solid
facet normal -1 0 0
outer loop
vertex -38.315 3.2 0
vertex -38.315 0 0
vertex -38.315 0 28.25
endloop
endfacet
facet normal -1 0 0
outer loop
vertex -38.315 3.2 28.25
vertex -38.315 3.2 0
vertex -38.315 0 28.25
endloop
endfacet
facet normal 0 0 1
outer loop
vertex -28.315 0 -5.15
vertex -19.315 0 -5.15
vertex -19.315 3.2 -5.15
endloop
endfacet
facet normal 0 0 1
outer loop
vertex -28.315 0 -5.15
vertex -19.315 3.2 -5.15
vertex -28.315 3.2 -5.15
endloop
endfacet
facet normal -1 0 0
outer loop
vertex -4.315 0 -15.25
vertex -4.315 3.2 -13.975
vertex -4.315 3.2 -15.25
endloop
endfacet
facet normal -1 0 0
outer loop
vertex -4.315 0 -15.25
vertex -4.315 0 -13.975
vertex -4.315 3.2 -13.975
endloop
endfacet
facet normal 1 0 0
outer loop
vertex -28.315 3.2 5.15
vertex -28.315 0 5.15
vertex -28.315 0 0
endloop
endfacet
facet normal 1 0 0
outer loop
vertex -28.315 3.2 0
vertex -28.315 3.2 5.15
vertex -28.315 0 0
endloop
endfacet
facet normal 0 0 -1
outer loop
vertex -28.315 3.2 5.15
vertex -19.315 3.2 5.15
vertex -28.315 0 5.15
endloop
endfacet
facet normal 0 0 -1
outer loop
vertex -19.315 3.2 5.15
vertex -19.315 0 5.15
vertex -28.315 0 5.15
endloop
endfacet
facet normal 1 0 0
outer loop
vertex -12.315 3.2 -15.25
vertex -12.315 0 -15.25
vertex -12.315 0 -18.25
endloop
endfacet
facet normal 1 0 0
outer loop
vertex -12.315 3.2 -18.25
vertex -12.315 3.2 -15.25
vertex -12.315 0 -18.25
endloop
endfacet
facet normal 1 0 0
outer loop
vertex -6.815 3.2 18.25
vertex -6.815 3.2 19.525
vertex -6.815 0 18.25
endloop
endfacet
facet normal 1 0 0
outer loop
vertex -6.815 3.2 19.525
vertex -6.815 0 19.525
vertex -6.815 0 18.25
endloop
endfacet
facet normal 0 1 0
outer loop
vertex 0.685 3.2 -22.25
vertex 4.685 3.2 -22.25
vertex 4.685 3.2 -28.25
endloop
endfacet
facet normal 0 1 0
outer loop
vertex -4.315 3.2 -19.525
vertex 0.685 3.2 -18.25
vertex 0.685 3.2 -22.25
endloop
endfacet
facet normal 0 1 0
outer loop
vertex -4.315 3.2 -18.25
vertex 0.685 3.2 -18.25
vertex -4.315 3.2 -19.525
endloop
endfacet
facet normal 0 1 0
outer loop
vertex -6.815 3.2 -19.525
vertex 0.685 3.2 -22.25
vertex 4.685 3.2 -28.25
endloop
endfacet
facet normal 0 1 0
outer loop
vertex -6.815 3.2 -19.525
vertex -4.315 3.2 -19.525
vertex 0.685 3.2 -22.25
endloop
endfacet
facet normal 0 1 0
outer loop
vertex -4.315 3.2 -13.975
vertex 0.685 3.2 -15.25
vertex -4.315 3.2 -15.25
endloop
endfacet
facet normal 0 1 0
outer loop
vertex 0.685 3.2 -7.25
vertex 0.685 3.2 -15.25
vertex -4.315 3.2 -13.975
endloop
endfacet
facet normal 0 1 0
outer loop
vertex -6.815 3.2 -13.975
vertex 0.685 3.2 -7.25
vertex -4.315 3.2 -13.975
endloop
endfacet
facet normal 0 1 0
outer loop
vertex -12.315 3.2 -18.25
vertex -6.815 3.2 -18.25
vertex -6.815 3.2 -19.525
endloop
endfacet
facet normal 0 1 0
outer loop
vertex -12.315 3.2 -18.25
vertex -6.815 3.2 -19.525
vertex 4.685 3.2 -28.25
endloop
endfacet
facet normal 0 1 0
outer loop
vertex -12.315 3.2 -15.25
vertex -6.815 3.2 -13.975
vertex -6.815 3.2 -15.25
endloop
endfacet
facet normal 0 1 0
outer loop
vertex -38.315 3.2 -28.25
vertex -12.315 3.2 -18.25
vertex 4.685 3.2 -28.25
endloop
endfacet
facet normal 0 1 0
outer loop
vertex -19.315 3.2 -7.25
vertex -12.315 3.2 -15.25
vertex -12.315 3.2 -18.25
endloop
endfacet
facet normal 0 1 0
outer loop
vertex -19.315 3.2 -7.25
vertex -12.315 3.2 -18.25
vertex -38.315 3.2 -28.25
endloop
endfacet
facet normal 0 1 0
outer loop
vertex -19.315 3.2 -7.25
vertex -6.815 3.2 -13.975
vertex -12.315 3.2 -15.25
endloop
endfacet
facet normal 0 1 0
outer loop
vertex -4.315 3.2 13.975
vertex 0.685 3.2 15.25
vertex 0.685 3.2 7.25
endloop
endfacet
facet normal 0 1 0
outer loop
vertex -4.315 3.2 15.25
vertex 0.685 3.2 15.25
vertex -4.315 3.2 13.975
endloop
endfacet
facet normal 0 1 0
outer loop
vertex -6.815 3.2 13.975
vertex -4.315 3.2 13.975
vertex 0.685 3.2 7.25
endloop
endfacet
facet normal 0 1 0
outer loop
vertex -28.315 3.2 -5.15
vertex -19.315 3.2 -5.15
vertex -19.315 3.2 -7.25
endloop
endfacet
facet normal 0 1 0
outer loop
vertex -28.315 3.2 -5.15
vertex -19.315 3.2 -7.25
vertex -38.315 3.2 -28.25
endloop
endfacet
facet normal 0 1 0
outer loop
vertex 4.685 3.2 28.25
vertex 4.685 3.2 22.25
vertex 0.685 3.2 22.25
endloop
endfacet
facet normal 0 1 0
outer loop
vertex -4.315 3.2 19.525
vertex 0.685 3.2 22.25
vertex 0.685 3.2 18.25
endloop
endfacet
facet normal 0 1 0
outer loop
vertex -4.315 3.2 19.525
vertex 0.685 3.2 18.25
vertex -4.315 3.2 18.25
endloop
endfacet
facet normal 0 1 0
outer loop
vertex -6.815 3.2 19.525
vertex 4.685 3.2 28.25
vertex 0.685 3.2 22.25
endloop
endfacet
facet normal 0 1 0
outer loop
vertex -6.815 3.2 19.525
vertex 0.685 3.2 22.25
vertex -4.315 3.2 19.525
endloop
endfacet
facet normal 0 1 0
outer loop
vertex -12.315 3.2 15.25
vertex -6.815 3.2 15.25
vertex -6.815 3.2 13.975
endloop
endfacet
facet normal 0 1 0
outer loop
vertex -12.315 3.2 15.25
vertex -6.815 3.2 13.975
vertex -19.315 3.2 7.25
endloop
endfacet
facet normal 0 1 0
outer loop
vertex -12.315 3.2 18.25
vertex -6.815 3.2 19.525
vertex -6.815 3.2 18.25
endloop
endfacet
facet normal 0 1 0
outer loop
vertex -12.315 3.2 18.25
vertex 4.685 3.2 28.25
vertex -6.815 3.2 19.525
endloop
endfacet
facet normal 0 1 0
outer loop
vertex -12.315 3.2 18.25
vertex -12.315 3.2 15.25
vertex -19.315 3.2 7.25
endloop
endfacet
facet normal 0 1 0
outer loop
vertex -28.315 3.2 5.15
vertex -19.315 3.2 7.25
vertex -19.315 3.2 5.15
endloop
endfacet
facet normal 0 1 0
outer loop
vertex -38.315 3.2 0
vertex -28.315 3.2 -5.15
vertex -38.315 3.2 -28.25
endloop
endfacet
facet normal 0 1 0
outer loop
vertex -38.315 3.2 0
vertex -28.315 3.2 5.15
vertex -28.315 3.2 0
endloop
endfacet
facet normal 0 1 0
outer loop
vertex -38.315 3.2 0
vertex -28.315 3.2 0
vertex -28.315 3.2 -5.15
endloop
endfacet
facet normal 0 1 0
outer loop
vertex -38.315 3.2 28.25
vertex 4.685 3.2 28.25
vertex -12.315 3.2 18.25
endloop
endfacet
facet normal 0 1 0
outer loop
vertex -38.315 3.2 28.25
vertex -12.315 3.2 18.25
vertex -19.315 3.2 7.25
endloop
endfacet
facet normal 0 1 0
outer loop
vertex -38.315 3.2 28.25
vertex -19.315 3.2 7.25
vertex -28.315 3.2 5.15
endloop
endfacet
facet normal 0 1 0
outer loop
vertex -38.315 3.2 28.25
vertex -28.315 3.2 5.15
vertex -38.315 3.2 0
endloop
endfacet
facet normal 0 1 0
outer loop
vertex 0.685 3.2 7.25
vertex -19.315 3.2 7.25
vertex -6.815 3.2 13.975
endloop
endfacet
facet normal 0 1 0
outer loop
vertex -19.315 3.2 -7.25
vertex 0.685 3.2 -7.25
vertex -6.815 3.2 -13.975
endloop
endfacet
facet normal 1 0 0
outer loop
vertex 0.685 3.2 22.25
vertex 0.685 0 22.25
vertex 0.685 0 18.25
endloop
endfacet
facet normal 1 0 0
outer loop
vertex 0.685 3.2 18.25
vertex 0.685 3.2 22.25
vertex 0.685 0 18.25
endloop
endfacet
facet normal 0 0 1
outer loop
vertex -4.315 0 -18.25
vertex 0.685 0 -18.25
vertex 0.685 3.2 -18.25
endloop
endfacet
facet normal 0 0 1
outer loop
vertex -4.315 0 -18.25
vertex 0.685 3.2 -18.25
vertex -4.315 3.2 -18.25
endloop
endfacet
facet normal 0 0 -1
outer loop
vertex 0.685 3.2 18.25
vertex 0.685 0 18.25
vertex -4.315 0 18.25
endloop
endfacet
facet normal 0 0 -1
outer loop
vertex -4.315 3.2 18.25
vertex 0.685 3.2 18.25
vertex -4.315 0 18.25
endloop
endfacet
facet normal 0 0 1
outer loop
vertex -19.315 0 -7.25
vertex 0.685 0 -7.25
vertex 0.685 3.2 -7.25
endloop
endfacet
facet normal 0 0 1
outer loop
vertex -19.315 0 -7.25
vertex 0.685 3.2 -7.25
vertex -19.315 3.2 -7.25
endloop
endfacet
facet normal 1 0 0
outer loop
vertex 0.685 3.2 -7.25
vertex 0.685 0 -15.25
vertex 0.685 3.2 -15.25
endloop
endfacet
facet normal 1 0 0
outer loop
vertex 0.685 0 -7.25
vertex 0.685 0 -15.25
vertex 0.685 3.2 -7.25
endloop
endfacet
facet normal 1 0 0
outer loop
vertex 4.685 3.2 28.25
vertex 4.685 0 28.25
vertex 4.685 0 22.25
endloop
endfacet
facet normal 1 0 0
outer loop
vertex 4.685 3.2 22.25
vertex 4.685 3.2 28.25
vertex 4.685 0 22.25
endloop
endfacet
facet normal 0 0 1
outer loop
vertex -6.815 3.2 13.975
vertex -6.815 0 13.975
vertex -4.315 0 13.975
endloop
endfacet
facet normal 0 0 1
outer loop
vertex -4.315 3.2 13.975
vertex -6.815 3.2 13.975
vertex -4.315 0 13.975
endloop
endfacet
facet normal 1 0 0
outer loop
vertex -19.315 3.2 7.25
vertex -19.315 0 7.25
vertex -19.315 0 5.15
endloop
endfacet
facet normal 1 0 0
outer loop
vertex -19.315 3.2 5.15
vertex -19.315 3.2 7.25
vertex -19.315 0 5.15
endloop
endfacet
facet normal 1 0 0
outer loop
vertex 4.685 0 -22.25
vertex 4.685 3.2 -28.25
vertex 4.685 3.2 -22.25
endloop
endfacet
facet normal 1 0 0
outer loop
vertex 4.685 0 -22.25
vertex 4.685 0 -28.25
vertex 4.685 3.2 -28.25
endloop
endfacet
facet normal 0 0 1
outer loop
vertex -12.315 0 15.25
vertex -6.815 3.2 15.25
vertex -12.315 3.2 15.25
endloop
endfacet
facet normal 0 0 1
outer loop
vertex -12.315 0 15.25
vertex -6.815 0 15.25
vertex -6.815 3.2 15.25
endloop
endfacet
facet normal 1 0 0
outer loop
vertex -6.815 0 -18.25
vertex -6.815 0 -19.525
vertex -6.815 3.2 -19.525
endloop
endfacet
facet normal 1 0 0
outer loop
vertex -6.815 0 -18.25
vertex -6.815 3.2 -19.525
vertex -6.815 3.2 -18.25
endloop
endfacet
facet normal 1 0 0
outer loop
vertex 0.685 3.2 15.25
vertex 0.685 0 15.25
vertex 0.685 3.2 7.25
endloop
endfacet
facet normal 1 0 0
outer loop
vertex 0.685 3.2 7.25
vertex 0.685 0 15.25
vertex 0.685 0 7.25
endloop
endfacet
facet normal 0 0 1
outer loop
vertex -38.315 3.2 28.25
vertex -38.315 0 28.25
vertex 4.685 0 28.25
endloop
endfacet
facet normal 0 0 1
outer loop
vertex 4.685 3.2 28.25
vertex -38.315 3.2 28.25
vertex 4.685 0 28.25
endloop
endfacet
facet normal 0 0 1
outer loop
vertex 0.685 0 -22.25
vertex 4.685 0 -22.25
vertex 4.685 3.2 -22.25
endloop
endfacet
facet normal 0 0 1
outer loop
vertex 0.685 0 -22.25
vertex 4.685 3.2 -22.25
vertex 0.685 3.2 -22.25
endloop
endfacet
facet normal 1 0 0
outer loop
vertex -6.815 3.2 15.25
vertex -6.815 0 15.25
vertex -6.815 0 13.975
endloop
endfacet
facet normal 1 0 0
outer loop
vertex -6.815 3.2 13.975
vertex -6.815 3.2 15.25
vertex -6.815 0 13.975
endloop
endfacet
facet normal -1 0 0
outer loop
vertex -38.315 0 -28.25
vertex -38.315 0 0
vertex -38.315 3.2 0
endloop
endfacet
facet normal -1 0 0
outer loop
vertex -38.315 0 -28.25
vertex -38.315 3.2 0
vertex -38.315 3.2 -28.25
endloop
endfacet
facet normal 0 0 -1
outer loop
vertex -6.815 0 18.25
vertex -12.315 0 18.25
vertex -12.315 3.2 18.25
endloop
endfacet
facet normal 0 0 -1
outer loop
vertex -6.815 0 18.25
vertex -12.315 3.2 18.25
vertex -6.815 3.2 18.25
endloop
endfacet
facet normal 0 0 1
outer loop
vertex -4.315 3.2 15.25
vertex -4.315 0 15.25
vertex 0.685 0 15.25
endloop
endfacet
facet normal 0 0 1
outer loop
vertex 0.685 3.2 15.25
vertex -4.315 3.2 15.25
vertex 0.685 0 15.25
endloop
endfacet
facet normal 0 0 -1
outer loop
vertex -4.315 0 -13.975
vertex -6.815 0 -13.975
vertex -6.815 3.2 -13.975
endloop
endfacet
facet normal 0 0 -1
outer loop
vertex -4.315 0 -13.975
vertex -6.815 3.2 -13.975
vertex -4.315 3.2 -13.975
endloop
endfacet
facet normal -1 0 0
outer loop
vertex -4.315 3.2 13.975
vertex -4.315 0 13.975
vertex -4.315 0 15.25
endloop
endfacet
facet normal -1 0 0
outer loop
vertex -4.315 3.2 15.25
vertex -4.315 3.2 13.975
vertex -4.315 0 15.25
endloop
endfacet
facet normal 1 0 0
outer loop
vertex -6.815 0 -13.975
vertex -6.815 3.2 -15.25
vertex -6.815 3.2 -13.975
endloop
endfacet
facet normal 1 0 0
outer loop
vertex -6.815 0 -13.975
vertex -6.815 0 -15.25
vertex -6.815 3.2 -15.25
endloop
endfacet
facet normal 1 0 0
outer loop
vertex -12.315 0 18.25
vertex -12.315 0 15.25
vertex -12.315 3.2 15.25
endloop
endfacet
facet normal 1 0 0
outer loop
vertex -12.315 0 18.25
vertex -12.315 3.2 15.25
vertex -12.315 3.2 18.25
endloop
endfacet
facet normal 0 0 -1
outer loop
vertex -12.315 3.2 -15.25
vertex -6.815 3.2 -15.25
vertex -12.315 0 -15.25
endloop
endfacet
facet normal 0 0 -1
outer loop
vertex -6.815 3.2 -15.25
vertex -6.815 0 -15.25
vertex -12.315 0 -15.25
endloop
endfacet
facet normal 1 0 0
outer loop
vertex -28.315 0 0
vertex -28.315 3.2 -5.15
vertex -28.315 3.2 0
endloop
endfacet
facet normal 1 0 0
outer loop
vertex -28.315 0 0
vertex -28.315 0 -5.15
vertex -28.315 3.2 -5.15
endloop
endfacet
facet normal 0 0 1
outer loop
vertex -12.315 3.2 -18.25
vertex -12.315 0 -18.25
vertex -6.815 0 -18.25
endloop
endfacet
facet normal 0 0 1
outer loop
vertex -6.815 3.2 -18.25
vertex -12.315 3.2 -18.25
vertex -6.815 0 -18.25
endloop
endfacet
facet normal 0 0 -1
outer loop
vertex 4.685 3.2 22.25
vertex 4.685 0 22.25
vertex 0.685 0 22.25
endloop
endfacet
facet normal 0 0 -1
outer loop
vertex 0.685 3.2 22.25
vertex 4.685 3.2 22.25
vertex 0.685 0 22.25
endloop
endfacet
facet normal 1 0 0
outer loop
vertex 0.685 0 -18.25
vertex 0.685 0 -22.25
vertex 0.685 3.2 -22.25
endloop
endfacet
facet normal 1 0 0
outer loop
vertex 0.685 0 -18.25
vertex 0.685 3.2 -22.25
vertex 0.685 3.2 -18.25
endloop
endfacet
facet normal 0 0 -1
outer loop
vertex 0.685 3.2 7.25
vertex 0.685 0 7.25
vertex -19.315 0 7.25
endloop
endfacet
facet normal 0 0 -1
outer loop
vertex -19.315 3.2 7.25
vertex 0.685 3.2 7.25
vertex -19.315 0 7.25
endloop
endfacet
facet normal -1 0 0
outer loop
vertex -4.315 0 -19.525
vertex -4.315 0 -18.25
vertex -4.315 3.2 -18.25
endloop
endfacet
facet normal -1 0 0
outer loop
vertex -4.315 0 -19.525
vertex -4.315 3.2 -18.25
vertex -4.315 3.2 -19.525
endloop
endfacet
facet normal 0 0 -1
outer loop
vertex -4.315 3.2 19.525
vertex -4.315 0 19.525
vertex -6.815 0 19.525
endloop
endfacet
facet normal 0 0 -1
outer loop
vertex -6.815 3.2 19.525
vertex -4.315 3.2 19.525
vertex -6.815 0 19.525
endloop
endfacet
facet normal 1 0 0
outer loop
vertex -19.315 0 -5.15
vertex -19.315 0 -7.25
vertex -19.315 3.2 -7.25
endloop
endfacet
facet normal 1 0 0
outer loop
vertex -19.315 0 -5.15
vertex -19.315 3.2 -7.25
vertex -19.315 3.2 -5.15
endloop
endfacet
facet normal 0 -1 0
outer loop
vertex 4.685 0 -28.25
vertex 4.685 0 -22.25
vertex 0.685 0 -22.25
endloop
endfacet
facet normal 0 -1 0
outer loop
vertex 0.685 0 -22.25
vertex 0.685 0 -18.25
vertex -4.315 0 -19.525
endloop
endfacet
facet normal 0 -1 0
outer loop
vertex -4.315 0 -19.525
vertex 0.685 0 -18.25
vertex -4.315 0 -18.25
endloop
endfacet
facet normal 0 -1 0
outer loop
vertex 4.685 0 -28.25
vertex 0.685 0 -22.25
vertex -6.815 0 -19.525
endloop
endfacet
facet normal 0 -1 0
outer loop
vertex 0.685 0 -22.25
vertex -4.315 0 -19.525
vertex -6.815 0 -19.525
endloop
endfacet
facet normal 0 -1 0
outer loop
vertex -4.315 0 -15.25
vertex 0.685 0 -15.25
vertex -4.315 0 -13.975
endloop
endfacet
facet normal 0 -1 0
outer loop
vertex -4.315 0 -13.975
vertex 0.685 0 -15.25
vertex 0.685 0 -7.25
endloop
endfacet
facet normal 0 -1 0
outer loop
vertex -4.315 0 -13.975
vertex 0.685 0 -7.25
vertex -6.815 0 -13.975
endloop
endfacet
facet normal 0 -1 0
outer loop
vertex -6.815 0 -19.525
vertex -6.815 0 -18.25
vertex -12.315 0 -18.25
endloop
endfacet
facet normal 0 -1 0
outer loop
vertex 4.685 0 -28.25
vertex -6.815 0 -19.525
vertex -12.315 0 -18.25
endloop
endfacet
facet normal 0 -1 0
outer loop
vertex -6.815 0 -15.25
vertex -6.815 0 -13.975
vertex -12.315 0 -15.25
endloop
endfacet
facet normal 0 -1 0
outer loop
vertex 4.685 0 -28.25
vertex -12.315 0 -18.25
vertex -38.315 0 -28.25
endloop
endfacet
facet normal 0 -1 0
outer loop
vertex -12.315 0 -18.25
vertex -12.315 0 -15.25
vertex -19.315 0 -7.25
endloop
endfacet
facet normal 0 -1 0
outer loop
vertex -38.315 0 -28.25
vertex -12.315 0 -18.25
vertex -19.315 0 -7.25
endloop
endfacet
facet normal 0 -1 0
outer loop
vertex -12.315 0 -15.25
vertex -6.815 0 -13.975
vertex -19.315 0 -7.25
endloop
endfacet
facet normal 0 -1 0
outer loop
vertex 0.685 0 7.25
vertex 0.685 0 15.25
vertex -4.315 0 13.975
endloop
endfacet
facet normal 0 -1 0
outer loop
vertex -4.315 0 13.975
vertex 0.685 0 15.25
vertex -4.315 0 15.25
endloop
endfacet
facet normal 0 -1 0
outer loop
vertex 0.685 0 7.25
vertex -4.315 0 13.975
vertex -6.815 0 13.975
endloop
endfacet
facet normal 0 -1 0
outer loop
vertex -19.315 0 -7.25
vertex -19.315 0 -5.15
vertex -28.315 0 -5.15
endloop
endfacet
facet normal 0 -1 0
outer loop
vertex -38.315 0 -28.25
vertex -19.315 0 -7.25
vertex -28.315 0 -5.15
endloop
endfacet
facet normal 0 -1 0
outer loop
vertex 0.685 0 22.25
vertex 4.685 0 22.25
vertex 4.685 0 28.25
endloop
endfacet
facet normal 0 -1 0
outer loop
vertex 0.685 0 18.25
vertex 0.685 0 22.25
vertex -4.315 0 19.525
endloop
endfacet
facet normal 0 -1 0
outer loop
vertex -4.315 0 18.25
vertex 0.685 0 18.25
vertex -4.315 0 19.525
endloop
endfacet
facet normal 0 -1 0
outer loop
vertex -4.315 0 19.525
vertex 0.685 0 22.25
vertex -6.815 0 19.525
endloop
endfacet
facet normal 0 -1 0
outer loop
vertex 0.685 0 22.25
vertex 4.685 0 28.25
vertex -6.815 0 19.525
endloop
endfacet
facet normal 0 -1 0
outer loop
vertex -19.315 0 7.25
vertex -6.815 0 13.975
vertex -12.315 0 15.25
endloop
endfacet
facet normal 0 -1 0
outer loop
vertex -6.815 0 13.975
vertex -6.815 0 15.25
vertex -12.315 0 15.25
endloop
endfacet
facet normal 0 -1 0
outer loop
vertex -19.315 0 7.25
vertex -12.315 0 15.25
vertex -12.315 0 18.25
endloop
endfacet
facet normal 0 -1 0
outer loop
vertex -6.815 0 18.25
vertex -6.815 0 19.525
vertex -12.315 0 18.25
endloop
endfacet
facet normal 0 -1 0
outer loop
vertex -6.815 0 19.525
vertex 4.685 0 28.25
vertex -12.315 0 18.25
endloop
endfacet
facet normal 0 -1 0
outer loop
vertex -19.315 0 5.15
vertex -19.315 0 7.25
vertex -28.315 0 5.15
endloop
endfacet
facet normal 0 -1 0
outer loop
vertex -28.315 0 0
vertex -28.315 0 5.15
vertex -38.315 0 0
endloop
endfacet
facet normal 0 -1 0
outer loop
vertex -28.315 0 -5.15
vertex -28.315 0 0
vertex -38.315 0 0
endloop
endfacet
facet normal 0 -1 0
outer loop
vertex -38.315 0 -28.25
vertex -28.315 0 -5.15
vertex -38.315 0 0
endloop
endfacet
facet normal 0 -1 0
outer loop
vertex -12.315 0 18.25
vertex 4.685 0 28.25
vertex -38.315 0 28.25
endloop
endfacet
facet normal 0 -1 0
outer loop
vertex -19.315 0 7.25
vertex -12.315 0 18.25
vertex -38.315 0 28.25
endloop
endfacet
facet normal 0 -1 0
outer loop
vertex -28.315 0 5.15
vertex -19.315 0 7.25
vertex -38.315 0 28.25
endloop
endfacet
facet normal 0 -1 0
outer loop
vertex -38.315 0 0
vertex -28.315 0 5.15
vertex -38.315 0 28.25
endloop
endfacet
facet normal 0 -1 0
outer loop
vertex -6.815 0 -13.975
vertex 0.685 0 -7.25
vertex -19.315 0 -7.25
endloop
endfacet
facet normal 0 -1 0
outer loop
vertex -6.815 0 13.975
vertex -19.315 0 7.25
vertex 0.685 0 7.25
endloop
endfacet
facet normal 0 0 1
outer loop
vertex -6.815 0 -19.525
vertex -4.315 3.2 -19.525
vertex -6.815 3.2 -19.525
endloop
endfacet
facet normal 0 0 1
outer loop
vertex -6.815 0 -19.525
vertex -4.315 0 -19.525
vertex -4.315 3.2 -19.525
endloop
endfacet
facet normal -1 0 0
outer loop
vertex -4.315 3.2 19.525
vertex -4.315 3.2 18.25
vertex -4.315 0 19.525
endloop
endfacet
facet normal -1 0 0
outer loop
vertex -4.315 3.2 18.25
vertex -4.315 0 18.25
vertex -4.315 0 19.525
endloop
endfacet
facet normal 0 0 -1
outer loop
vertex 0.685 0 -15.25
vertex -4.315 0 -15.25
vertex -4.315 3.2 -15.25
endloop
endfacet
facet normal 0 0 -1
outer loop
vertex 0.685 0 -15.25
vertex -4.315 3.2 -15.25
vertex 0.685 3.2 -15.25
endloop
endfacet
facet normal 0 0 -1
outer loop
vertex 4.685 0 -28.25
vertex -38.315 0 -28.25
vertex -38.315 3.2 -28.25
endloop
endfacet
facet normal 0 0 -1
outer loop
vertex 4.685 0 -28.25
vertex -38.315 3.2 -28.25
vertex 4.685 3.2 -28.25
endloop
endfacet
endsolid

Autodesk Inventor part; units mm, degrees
ref_plane "YZ Plane" through (0, 0, 0) normal (1, 0, 0) x (0, 1, 0)
ref_plane "XZ Plane" through (0, 0, 0) normal (0, 1, 0) x (-1, 0, 0)
ref_plane "XY Plane" through (0, 0, 0) normal (0, 0, 1) x (1, 0, 0)
sketch "Sketch1" plane through (0, 0, 0) normal (0, 1, 0) x (-1, 0, 0)
  line L0 (38.3151, 0) -> (38.3151, -28.25)
  line L1 (38.3151, -28.25) -> (-4.6849, -28.25)
  line L2 (-4.6849, -28.25) -> (-4.6849, -22.25)
  line L3 (-4.6849, -22.25) -> (-0.6849, -22.25)
  line L4 (-0.6849, -22.25) -> (-0.6849, -18.25)
  line L5 (-0.6849, -18.25) -> (4.3151, -18.25)
  line L6 (4.3151, -18.25) -> (4.3151, -19.525)
  line L7 (4.3151, -19.525) -> (6.8151, -19.525)
  line L8 (6.8151, -13.975) -> (4.3151, -13.975)
  line L9 (4.3151, -13.975) -> (4.3151, -15.25)
  line L10 (4.3151, -15.25) -> (-0.6849, -15.25)
  line L11 (-0.6849, -15.25) -> (-0.6849, -7.25)
  line L12 (-0.6849, -7.25) -> (19.3151, -7.25)
  line L13 (19.3151, -7.25) -> (19.3151, -5.15)
  line L14 (19.3151, -5.15) -> (28.3151, -5.15)
  line L15 (28.3151, -5.15) -> (28.3151, 0)
  line L16 (0, 0) -> (38.3151, 0) construction
  line L17 (6.8151, -15.25) -> (12.3151, -15.25)
  line L18 (12.3151, -15.25) -> (12.3151, -18.25)
  line L19 (12.3151, -18.25) -> (6.8151, -18.25)
  line L20 (6.8151, -19.525) -> (6.8151, -18.25)
  line L21 (6.8151, -15.25) -> (6.8151, -13.975)
  line L22 (38.3151, 0) -> (38.3151, 28.25)
  line L23 (38.3151, 28.25) -> (-4.6849, 28.25)
  line L24 (-4.6849, 28.25) -> (-4.6849, 22.25)
  line L25 (-4.6849, 22.25) -> (-0.6849, 22.25)
  line L26 (-0.6849, 22.25) -> (-0.6849, 18.25)
  line L27 (-0.6849, 18.25) -> (4.3151, 18.25)
  line L28 (4.3151, 18.25) -> (4.3151, 19.525)
  line L29 (4.3151, 19.525) -> (6.8151, 19.525)
  line L30 (6.8151, 13.975) -> (4.3151, 13.975)
  line L31 (4.3151, 13.975) -> (4.3151, 15.25)
  line L32 (4.3151, 15.25) -> (-0.6849, 15.25)
  line L33 (-0.6849, 15.25) -> (-0.6849, 7.25)
  line L34 (-0.6849, 7.25) -> (19.3151, 7.25)
  line L35 (19.3151, 7.25) -> (19.3151, 5.15)
  line L36 (19.3151, 5.15) -> (28.3151, 5.15)
  line L37 (28.3151, 5.15) -> (28.3151, 0)
  line L38 (6.8151, 15.25) -> (12.3151, 15.25)
  line L39 (12.3151, 15.25) -> (12.3151, 18.25)
  line L40 (12.3151, 18.25) -> (6.8151, 18.25)
  line L41 (6.8151, 19.525) -> (6.8151, 18.25)
  line L42 (6.8151, 15.25) -> (6.8151, 13.975)
  dimension "d0" = 5.55
  dimension "d1" = 2.5
  dimension "d2" = 3
  dimension "d3" = 6
  dimension "d4" = 5
  dimension "d7" = 4
  dimension "d9" = 24
  dimension "d10" = 17
  dimension "d11" = 10.3
  dimension "d12" = 9
  dimension "d13" = 14.5
  dimension "d14" = 8
  dimension "d15" = 4
  dimension "d16" = 10
extrude "Extrusion1" add sketch "Sketch1" along normal blind 3.2
properties part number "Soporte_Plug_Alimentacion"
